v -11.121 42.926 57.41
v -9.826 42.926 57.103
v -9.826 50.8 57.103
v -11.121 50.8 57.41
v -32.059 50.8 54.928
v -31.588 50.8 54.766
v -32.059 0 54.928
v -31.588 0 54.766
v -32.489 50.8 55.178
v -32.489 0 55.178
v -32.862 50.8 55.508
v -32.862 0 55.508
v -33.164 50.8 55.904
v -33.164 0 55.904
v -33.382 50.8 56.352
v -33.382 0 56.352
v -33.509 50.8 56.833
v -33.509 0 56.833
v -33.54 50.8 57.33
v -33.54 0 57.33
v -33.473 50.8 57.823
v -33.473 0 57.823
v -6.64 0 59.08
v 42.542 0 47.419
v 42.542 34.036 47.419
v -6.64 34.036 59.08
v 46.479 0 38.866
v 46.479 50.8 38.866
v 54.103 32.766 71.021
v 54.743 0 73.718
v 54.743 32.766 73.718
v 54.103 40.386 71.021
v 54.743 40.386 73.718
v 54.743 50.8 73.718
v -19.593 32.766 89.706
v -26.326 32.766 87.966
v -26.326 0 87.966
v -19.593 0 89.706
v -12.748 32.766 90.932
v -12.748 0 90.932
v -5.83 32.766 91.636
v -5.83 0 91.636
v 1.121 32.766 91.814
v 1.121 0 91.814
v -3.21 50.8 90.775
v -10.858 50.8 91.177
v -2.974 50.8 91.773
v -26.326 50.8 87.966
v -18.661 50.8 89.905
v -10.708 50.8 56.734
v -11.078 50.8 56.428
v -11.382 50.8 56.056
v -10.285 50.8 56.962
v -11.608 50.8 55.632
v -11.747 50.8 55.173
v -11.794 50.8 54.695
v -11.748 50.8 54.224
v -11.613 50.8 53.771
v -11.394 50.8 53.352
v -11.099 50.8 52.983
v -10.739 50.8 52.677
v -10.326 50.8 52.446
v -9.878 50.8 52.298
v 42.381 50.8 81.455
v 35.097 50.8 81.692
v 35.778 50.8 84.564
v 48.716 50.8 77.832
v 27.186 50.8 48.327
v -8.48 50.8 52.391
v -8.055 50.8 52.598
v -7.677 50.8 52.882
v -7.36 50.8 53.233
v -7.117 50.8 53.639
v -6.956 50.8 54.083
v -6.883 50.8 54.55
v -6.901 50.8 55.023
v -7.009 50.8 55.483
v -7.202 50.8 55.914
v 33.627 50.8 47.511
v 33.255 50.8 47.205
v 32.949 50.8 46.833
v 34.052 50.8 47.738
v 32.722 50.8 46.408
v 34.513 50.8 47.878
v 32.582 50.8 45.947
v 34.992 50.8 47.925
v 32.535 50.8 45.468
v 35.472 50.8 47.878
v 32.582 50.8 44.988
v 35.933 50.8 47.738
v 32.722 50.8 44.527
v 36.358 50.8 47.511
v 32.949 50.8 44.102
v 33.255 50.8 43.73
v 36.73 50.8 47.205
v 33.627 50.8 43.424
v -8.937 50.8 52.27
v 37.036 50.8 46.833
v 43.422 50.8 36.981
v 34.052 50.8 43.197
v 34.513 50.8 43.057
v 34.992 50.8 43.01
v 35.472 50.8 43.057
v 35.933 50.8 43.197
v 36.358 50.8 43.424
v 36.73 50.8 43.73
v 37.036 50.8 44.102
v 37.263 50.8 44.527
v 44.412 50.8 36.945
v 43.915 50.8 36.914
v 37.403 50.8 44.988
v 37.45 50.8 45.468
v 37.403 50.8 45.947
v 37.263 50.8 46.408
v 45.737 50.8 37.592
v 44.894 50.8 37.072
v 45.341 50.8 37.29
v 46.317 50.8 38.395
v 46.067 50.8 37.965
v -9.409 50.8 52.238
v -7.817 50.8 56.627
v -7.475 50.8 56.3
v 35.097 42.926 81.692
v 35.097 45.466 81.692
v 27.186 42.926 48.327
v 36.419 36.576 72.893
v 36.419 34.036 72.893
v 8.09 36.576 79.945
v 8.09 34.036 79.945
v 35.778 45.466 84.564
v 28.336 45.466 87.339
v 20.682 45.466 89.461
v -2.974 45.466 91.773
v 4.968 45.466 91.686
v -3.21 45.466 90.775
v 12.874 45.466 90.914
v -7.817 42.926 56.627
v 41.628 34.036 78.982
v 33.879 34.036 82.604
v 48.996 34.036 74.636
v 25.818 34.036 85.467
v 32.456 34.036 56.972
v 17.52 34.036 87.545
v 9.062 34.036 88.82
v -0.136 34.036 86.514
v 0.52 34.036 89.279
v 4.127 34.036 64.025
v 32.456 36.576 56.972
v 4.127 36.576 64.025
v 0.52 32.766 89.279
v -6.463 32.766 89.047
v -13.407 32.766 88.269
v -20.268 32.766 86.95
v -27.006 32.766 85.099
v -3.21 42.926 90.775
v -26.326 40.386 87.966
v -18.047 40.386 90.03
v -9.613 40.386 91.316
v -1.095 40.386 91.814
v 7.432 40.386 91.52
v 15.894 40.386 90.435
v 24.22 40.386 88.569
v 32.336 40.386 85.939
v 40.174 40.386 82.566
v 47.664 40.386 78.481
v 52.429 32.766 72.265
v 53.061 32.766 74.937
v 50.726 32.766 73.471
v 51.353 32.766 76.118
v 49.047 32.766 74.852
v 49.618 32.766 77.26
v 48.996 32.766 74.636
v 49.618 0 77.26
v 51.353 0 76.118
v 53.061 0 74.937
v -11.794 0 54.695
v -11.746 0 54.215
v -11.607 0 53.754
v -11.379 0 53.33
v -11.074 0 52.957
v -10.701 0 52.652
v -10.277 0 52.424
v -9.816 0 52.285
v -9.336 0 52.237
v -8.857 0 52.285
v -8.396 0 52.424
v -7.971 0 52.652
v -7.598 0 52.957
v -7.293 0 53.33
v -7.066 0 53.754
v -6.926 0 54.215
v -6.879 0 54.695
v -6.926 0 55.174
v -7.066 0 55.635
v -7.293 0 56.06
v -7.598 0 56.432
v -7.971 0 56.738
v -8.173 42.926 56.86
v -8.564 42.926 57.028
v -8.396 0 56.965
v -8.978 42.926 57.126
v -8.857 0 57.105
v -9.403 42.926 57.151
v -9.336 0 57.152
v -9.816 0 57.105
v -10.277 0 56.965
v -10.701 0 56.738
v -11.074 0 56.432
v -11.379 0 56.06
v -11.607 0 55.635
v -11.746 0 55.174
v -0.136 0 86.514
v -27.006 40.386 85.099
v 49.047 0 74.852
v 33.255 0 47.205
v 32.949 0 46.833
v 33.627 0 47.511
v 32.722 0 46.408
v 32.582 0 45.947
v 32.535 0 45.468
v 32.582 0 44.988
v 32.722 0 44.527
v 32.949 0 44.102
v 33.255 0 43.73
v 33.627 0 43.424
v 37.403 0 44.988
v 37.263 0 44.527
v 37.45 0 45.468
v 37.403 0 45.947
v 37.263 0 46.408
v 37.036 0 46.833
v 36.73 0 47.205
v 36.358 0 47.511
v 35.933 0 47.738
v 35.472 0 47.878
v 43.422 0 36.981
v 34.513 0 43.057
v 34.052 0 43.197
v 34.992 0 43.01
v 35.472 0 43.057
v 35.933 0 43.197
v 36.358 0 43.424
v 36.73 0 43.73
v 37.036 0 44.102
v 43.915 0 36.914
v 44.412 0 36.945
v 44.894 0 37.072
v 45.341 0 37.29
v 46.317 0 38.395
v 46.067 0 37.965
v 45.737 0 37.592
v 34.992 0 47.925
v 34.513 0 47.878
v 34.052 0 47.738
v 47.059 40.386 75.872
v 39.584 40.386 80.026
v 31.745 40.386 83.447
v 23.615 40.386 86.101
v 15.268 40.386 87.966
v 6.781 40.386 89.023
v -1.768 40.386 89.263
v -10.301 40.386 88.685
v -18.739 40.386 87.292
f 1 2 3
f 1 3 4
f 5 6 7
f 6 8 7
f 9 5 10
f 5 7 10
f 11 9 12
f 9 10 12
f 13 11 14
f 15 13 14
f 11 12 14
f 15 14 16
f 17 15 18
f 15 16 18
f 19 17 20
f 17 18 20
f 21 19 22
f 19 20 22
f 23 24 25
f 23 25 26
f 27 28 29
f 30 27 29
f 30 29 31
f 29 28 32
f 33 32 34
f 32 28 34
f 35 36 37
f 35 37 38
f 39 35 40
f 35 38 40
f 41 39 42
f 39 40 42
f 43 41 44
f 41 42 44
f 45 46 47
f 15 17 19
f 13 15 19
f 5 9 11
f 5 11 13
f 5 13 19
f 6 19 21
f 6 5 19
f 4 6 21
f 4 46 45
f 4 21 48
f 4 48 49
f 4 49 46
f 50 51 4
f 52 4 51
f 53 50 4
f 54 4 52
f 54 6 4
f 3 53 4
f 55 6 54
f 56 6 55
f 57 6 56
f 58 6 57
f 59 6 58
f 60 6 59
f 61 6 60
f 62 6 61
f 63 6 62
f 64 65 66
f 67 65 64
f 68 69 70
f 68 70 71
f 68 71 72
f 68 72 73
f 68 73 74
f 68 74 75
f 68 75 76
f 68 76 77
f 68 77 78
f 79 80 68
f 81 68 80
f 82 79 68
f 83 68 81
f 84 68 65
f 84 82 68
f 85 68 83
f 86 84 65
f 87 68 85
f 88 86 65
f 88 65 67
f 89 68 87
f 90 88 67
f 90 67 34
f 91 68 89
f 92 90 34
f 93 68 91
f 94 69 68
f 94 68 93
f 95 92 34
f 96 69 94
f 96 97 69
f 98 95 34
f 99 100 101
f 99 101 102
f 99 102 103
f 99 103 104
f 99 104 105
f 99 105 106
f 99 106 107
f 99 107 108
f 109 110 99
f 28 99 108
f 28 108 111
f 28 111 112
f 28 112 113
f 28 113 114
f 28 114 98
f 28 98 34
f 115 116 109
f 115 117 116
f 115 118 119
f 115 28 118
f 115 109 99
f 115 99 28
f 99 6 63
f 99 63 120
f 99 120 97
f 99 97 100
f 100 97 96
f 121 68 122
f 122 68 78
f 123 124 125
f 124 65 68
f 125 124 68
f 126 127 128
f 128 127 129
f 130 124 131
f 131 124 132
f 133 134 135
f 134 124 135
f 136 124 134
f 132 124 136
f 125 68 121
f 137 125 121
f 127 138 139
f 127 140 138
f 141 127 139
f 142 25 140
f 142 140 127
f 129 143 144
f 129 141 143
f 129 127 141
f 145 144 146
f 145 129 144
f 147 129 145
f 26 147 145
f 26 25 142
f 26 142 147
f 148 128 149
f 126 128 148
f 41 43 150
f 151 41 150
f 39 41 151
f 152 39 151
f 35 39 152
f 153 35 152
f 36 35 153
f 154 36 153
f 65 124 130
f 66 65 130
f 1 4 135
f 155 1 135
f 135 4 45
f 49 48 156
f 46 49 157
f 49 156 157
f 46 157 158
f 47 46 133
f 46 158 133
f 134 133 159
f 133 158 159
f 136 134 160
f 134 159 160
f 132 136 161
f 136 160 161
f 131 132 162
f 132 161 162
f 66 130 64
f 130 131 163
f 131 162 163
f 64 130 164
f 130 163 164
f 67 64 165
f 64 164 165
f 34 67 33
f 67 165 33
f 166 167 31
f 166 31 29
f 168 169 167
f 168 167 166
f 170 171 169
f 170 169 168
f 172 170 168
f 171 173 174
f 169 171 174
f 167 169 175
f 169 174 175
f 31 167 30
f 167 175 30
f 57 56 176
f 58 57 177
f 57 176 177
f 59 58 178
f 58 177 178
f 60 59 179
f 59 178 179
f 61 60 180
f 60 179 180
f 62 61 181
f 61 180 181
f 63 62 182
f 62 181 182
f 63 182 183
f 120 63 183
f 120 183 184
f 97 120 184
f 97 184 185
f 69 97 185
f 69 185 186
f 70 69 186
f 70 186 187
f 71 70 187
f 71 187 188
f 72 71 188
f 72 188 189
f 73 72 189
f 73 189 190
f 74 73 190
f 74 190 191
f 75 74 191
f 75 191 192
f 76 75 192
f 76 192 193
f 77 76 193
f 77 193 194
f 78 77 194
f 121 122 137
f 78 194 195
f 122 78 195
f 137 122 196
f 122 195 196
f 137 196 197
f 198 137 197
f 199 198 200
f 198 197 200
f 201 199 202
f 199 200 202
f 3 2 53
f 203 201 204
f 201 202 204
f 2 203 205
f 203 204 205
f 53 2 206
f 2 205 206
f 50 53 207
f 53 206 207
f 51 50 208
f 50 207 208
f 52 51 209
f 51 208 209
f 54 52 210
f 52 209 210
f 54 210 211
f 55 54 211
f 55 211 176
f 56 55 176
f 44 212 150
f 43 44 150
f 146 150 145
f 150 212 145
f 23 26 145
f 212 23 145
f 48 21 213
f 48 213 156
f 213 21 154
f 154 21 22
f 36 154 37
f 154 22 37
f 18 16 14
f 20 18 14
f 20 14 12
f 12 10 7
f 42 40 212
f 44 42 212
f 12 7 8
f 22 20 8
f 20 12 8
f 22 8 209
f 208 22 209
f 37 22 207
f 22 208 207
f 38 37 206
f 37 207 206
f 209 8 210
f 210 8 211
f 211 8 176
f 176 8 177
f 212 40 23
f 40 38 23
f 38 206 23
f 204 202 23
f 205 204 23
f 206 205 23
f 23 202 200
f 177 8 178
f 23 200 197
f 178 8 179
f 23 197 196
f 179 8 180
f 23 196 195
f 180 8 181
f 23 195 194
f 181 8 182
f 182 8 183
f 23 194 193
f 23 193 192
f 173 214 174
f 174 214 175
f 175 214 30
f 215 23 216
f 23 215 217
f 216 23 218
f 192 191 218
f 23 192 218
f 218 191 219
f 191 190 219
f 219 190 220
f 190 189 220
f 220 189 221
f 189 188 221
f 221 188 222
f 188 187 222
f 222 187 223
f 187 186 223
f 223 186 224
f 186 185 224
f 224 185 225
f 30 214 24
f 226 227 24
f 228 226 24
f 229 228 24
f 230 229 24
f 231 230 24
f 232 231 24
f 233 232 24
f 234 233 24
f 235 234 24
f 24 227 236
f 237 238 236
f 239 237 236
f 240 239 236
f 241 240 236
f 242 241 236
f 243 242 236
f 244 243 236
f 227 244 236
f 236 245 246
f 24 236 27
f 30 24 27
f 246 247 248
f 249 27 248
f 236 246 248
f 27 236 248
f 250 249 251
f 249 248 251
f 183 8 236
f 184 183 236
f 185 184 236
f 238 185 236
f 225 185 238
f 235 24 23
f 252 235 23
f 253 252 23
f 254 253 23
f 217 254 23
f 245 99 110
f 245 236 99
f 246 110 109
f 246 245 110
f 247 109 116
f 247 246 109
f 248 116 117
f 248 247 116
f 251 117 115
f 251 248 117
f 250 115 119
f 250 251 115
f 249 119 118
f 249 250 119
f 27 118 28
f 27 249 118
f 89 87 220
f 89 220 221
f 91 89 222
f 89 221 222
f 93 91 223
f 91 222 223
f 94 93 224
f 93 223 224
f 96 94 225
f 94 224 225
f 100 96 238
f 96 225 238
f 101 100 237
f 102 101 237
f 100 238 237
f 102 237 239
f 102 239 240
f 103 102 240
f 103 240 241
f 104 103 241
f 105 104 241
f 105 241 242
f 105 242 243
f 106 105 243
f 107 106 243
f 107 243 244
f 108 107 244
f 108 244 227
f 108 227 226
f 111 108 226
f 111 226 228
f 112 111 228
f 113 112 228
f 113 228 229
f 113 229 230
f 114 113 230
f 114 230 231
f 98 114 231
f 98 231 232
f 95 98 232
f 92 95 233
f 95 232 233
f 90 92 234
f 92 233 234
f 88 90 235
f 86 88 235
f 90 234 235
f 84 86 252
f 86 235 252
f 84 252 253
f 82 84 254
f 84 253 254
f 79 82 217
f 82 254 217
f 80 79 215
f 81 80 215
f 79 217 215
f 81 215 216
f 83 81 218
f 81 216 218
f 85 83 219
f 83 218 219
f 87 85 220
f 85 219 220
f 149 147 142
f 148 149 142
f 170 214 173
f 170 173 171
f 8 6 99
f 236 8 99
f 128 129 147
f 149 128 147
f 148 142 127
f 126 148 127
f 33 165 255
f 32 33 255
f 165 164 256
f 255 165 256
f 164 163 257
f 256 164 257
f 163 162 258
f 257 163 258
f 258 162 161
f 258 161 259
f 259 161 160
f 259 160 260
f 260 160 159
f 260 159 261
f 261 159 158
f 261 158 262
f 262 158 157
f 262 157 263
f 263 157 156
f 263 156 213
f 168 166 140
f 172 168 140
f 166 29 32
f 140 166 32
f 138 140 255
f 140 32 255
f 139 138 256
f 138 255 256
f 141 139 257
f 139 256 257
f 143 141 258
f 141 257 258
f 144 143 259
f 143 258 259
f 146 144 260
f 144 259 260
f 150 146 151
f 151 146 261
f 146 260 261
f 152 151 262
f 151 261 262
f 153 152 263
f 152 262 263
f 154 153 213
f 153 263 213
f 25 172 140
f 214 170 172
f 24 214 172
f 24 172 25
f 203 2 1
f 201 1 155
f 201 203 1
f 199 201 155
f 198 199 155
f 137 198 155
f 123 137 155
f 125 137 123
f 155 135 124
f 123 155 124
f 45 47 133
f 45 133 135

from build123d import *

# Parameters (mm, degrees)
BOSS_EXTRUDE1_DEPTH          = 50.8
CUT_EXTRUDE1_START           = -50.8
CUT_EXTRUDE1_DEPTH           = 34.036
SKETCH10_W                   = 50.546
SKETCH10_H                   = 34.036
CUT_EXTRUDE3_DEPTH           = 20.734311378
CUT_EXTRUDE4_DEPTH           = 2.54
CUT_EXTRUDE5_DEPTH           = 7.874
FILLET1_R                    = 2.54
FILLET2_R                    = 2.54
CUT_EXTRUDE6_DEPTH           = 51.8
F_10_0_1935_DIAMETER_HOLE1_D = 4.9149
FILLET3_R                    = 2.54
CUT_EXTRUDE7_DEPTH           = 5.334
SKETCH18_W                   = 7.62
SKETCH18_H                   = 2.54


with BuildPart() as part:
    # Sketch1 → Boss-Extrude1 (new body)
    with BuildSketch(Plane(origin=(0, 0, 0), x_dir=(1, 0, 0), z_dir=(0, 1, 0))):
        with BuildLine():
            Line((63.017839503, -66.782093), (53.468205472, -26.506342671))
            Line((53.468205472, -26.506342671), (-35.875703335, -47.690346072))
            Line((-35.875703335, -47.690346072), (-26.326069304, -87.966096401))
            ThreePointArc((-26.326069304, -87.966096401), (21.184003401, -89.343908807), (63.017839503, -66.782093))
        make_face()
    extrude(amount=BOSS_EXTRUDE1_DEPTH)

    # Sketch2 → Cut-Extrude1 (cut)
    with BuildSketch(Plane(origin=(0, 50.8, 0), x_dir=(1, 0, 0), z_dir=(0, 1, 0)).offset(CUT_EXTRUDE1_START)):
        Polygon((19.413866358, -81.878324539), (49.046880649, -74.852150244), (42.542248899, -47.418750859), (-6.6401518, -59.08020778), (-0.13552005, -86.513607165), align=None)
    extrude(amount=CUT_EXTRUDE1_DEPTH, mode=Mode.SUBTRACT)

    # Sketch10 → Cut-Extrude3 (cut, through all)
    with BuildSketch(Plane(origin=(19.413866358, 0, 81.878324539), x_dir=(-0.973022607, 0, 0.230709788), z_dir=(-0.230709788, 0, -0.973022607))):
        with Locations((-5.1816, 17.018)):
            Rectangle(SKETCH10_W, SKETCH10_H)
    extrude(amount=-CUT_EXTRUDE3_DEPTH, mode=Mode.SUBTRACT)

    # Sketch11 → Cut-Extrude4 (cut)
    with BuildSketch(Plane.XZ.offset(-34.036)):
        Polygon((4.126655542, 64.024522649), (32.455610184, 56.972208264), (36.418920031, 72.892715879), (8.089965389, 79.945030264), align=None)
    extrude(amount=-CUT_EXTRUDE4_DEPTH, mode=Mode.SUBTRACT)

    # Sketch12 → Cut-Extrude5 (cut)
    with BuildSketch(Plane(origin=(0, 50.8, 0), x_dir=(1, 0, 0), z_dir=(0, 1, 0))):
        Polygon((-3.21042467, -90.775014105), (35.097475372, -81.69196977), (27.186436757, -48.327024572), (-11.121463285, -57.410068908), align=None)
    extrude(amount=-CUT_EXTRUDE5_DEPTH, mode=Mode.SUBTRACT)

    # Fillet1
    fillet1_edges = [part.edges().sort_by_distance(p)[0] for p in [
        (53.468205472, 25.4, 26.506342671),
    ]]
    fillet(fillet1_edges, radius=FILLET1_R)

    # Fillet2
    fillet2_edges = [part.edges().sort_by_distance(p)[0] for p in [
        (-35.875703335, 25.4, 47.690346072),
    ]]
    fillet(fillet2_edges, radius=FILLET2_R)

    # Sketch13 → Cut-Extrude6 (cut, through all)
    with BuildSketch(Plane(origin=(0, 50.8, 0), x_dir=(1, 0, 0), z_dir=(0, 1, 0))):
        Polygon((56.792853338, -82.364213599), (69.150240448, -79.434199297), (54.970742259, -19.631915037), (-50.56134592, -44.654237709), (-47.281500933, -58.487041918), (45.893200136, -36.394733549), align=None)
    extrude(amount=-CUT_EXTRUDE6_DEPTH, mode=Mode.SUBTRACT)

    # #10 (0.1935) Diameter Hole1 (through all)
    with Locations(Plane(origin=(0, 50.8, 0), x_dir=(1, 0, 0), z_dir=(0, 1, 0))):
        with Locations((-9.336173019, -54.694807642), (34.992334459, -45.467652744)):
            Hole(F_10_0_1935_DIAMETER_HOLE1_D / 2)

    # Fillet3
    fillet3_edges = [part.edges().sort_by_distance(p)[0] for p in [
        (-34.059094468, 25.4, 55.35192608),
        (45.893200136, 25.4, 36.394733549),
    ]]
    fillet(fillet3_edges, radius=FILLET3_R)

    # Sketch17 → Cut-Extrude7 (cut)
    with BuildSketch(Plane(origin=(0, 50.8, 0), x_dir=(1, 0, 0), z_dir=(0, 1, 0))):
        Polygon((-5.287837916, -82.013487021), (33.020062126, -72.930442686), (37.24926209, -90.767168294), (-1.058637951, -99.850212629), align=None)
    extrude(amount=-CUT_EXTRUDE7_DEPTH, mode=Mode.SUBTRACT)

    # Sketch18 → Cut-Revolve1 (revolve, cut)
    with BuildSketch(Plane(origin=(0, 0, 0), x_dir=(0, 1, 0), z_dir=(0.999925437, 0, -0.012211508))):
        with Locations((36.576, 90.551)):
            Rectangle(SKETCH18_W, SKETCH18_H)
    revolve(axis=Axis((0, 50.8, 0), (0, -1, 0)), mode=Mode.SUBTRACT)


solid = part.part
